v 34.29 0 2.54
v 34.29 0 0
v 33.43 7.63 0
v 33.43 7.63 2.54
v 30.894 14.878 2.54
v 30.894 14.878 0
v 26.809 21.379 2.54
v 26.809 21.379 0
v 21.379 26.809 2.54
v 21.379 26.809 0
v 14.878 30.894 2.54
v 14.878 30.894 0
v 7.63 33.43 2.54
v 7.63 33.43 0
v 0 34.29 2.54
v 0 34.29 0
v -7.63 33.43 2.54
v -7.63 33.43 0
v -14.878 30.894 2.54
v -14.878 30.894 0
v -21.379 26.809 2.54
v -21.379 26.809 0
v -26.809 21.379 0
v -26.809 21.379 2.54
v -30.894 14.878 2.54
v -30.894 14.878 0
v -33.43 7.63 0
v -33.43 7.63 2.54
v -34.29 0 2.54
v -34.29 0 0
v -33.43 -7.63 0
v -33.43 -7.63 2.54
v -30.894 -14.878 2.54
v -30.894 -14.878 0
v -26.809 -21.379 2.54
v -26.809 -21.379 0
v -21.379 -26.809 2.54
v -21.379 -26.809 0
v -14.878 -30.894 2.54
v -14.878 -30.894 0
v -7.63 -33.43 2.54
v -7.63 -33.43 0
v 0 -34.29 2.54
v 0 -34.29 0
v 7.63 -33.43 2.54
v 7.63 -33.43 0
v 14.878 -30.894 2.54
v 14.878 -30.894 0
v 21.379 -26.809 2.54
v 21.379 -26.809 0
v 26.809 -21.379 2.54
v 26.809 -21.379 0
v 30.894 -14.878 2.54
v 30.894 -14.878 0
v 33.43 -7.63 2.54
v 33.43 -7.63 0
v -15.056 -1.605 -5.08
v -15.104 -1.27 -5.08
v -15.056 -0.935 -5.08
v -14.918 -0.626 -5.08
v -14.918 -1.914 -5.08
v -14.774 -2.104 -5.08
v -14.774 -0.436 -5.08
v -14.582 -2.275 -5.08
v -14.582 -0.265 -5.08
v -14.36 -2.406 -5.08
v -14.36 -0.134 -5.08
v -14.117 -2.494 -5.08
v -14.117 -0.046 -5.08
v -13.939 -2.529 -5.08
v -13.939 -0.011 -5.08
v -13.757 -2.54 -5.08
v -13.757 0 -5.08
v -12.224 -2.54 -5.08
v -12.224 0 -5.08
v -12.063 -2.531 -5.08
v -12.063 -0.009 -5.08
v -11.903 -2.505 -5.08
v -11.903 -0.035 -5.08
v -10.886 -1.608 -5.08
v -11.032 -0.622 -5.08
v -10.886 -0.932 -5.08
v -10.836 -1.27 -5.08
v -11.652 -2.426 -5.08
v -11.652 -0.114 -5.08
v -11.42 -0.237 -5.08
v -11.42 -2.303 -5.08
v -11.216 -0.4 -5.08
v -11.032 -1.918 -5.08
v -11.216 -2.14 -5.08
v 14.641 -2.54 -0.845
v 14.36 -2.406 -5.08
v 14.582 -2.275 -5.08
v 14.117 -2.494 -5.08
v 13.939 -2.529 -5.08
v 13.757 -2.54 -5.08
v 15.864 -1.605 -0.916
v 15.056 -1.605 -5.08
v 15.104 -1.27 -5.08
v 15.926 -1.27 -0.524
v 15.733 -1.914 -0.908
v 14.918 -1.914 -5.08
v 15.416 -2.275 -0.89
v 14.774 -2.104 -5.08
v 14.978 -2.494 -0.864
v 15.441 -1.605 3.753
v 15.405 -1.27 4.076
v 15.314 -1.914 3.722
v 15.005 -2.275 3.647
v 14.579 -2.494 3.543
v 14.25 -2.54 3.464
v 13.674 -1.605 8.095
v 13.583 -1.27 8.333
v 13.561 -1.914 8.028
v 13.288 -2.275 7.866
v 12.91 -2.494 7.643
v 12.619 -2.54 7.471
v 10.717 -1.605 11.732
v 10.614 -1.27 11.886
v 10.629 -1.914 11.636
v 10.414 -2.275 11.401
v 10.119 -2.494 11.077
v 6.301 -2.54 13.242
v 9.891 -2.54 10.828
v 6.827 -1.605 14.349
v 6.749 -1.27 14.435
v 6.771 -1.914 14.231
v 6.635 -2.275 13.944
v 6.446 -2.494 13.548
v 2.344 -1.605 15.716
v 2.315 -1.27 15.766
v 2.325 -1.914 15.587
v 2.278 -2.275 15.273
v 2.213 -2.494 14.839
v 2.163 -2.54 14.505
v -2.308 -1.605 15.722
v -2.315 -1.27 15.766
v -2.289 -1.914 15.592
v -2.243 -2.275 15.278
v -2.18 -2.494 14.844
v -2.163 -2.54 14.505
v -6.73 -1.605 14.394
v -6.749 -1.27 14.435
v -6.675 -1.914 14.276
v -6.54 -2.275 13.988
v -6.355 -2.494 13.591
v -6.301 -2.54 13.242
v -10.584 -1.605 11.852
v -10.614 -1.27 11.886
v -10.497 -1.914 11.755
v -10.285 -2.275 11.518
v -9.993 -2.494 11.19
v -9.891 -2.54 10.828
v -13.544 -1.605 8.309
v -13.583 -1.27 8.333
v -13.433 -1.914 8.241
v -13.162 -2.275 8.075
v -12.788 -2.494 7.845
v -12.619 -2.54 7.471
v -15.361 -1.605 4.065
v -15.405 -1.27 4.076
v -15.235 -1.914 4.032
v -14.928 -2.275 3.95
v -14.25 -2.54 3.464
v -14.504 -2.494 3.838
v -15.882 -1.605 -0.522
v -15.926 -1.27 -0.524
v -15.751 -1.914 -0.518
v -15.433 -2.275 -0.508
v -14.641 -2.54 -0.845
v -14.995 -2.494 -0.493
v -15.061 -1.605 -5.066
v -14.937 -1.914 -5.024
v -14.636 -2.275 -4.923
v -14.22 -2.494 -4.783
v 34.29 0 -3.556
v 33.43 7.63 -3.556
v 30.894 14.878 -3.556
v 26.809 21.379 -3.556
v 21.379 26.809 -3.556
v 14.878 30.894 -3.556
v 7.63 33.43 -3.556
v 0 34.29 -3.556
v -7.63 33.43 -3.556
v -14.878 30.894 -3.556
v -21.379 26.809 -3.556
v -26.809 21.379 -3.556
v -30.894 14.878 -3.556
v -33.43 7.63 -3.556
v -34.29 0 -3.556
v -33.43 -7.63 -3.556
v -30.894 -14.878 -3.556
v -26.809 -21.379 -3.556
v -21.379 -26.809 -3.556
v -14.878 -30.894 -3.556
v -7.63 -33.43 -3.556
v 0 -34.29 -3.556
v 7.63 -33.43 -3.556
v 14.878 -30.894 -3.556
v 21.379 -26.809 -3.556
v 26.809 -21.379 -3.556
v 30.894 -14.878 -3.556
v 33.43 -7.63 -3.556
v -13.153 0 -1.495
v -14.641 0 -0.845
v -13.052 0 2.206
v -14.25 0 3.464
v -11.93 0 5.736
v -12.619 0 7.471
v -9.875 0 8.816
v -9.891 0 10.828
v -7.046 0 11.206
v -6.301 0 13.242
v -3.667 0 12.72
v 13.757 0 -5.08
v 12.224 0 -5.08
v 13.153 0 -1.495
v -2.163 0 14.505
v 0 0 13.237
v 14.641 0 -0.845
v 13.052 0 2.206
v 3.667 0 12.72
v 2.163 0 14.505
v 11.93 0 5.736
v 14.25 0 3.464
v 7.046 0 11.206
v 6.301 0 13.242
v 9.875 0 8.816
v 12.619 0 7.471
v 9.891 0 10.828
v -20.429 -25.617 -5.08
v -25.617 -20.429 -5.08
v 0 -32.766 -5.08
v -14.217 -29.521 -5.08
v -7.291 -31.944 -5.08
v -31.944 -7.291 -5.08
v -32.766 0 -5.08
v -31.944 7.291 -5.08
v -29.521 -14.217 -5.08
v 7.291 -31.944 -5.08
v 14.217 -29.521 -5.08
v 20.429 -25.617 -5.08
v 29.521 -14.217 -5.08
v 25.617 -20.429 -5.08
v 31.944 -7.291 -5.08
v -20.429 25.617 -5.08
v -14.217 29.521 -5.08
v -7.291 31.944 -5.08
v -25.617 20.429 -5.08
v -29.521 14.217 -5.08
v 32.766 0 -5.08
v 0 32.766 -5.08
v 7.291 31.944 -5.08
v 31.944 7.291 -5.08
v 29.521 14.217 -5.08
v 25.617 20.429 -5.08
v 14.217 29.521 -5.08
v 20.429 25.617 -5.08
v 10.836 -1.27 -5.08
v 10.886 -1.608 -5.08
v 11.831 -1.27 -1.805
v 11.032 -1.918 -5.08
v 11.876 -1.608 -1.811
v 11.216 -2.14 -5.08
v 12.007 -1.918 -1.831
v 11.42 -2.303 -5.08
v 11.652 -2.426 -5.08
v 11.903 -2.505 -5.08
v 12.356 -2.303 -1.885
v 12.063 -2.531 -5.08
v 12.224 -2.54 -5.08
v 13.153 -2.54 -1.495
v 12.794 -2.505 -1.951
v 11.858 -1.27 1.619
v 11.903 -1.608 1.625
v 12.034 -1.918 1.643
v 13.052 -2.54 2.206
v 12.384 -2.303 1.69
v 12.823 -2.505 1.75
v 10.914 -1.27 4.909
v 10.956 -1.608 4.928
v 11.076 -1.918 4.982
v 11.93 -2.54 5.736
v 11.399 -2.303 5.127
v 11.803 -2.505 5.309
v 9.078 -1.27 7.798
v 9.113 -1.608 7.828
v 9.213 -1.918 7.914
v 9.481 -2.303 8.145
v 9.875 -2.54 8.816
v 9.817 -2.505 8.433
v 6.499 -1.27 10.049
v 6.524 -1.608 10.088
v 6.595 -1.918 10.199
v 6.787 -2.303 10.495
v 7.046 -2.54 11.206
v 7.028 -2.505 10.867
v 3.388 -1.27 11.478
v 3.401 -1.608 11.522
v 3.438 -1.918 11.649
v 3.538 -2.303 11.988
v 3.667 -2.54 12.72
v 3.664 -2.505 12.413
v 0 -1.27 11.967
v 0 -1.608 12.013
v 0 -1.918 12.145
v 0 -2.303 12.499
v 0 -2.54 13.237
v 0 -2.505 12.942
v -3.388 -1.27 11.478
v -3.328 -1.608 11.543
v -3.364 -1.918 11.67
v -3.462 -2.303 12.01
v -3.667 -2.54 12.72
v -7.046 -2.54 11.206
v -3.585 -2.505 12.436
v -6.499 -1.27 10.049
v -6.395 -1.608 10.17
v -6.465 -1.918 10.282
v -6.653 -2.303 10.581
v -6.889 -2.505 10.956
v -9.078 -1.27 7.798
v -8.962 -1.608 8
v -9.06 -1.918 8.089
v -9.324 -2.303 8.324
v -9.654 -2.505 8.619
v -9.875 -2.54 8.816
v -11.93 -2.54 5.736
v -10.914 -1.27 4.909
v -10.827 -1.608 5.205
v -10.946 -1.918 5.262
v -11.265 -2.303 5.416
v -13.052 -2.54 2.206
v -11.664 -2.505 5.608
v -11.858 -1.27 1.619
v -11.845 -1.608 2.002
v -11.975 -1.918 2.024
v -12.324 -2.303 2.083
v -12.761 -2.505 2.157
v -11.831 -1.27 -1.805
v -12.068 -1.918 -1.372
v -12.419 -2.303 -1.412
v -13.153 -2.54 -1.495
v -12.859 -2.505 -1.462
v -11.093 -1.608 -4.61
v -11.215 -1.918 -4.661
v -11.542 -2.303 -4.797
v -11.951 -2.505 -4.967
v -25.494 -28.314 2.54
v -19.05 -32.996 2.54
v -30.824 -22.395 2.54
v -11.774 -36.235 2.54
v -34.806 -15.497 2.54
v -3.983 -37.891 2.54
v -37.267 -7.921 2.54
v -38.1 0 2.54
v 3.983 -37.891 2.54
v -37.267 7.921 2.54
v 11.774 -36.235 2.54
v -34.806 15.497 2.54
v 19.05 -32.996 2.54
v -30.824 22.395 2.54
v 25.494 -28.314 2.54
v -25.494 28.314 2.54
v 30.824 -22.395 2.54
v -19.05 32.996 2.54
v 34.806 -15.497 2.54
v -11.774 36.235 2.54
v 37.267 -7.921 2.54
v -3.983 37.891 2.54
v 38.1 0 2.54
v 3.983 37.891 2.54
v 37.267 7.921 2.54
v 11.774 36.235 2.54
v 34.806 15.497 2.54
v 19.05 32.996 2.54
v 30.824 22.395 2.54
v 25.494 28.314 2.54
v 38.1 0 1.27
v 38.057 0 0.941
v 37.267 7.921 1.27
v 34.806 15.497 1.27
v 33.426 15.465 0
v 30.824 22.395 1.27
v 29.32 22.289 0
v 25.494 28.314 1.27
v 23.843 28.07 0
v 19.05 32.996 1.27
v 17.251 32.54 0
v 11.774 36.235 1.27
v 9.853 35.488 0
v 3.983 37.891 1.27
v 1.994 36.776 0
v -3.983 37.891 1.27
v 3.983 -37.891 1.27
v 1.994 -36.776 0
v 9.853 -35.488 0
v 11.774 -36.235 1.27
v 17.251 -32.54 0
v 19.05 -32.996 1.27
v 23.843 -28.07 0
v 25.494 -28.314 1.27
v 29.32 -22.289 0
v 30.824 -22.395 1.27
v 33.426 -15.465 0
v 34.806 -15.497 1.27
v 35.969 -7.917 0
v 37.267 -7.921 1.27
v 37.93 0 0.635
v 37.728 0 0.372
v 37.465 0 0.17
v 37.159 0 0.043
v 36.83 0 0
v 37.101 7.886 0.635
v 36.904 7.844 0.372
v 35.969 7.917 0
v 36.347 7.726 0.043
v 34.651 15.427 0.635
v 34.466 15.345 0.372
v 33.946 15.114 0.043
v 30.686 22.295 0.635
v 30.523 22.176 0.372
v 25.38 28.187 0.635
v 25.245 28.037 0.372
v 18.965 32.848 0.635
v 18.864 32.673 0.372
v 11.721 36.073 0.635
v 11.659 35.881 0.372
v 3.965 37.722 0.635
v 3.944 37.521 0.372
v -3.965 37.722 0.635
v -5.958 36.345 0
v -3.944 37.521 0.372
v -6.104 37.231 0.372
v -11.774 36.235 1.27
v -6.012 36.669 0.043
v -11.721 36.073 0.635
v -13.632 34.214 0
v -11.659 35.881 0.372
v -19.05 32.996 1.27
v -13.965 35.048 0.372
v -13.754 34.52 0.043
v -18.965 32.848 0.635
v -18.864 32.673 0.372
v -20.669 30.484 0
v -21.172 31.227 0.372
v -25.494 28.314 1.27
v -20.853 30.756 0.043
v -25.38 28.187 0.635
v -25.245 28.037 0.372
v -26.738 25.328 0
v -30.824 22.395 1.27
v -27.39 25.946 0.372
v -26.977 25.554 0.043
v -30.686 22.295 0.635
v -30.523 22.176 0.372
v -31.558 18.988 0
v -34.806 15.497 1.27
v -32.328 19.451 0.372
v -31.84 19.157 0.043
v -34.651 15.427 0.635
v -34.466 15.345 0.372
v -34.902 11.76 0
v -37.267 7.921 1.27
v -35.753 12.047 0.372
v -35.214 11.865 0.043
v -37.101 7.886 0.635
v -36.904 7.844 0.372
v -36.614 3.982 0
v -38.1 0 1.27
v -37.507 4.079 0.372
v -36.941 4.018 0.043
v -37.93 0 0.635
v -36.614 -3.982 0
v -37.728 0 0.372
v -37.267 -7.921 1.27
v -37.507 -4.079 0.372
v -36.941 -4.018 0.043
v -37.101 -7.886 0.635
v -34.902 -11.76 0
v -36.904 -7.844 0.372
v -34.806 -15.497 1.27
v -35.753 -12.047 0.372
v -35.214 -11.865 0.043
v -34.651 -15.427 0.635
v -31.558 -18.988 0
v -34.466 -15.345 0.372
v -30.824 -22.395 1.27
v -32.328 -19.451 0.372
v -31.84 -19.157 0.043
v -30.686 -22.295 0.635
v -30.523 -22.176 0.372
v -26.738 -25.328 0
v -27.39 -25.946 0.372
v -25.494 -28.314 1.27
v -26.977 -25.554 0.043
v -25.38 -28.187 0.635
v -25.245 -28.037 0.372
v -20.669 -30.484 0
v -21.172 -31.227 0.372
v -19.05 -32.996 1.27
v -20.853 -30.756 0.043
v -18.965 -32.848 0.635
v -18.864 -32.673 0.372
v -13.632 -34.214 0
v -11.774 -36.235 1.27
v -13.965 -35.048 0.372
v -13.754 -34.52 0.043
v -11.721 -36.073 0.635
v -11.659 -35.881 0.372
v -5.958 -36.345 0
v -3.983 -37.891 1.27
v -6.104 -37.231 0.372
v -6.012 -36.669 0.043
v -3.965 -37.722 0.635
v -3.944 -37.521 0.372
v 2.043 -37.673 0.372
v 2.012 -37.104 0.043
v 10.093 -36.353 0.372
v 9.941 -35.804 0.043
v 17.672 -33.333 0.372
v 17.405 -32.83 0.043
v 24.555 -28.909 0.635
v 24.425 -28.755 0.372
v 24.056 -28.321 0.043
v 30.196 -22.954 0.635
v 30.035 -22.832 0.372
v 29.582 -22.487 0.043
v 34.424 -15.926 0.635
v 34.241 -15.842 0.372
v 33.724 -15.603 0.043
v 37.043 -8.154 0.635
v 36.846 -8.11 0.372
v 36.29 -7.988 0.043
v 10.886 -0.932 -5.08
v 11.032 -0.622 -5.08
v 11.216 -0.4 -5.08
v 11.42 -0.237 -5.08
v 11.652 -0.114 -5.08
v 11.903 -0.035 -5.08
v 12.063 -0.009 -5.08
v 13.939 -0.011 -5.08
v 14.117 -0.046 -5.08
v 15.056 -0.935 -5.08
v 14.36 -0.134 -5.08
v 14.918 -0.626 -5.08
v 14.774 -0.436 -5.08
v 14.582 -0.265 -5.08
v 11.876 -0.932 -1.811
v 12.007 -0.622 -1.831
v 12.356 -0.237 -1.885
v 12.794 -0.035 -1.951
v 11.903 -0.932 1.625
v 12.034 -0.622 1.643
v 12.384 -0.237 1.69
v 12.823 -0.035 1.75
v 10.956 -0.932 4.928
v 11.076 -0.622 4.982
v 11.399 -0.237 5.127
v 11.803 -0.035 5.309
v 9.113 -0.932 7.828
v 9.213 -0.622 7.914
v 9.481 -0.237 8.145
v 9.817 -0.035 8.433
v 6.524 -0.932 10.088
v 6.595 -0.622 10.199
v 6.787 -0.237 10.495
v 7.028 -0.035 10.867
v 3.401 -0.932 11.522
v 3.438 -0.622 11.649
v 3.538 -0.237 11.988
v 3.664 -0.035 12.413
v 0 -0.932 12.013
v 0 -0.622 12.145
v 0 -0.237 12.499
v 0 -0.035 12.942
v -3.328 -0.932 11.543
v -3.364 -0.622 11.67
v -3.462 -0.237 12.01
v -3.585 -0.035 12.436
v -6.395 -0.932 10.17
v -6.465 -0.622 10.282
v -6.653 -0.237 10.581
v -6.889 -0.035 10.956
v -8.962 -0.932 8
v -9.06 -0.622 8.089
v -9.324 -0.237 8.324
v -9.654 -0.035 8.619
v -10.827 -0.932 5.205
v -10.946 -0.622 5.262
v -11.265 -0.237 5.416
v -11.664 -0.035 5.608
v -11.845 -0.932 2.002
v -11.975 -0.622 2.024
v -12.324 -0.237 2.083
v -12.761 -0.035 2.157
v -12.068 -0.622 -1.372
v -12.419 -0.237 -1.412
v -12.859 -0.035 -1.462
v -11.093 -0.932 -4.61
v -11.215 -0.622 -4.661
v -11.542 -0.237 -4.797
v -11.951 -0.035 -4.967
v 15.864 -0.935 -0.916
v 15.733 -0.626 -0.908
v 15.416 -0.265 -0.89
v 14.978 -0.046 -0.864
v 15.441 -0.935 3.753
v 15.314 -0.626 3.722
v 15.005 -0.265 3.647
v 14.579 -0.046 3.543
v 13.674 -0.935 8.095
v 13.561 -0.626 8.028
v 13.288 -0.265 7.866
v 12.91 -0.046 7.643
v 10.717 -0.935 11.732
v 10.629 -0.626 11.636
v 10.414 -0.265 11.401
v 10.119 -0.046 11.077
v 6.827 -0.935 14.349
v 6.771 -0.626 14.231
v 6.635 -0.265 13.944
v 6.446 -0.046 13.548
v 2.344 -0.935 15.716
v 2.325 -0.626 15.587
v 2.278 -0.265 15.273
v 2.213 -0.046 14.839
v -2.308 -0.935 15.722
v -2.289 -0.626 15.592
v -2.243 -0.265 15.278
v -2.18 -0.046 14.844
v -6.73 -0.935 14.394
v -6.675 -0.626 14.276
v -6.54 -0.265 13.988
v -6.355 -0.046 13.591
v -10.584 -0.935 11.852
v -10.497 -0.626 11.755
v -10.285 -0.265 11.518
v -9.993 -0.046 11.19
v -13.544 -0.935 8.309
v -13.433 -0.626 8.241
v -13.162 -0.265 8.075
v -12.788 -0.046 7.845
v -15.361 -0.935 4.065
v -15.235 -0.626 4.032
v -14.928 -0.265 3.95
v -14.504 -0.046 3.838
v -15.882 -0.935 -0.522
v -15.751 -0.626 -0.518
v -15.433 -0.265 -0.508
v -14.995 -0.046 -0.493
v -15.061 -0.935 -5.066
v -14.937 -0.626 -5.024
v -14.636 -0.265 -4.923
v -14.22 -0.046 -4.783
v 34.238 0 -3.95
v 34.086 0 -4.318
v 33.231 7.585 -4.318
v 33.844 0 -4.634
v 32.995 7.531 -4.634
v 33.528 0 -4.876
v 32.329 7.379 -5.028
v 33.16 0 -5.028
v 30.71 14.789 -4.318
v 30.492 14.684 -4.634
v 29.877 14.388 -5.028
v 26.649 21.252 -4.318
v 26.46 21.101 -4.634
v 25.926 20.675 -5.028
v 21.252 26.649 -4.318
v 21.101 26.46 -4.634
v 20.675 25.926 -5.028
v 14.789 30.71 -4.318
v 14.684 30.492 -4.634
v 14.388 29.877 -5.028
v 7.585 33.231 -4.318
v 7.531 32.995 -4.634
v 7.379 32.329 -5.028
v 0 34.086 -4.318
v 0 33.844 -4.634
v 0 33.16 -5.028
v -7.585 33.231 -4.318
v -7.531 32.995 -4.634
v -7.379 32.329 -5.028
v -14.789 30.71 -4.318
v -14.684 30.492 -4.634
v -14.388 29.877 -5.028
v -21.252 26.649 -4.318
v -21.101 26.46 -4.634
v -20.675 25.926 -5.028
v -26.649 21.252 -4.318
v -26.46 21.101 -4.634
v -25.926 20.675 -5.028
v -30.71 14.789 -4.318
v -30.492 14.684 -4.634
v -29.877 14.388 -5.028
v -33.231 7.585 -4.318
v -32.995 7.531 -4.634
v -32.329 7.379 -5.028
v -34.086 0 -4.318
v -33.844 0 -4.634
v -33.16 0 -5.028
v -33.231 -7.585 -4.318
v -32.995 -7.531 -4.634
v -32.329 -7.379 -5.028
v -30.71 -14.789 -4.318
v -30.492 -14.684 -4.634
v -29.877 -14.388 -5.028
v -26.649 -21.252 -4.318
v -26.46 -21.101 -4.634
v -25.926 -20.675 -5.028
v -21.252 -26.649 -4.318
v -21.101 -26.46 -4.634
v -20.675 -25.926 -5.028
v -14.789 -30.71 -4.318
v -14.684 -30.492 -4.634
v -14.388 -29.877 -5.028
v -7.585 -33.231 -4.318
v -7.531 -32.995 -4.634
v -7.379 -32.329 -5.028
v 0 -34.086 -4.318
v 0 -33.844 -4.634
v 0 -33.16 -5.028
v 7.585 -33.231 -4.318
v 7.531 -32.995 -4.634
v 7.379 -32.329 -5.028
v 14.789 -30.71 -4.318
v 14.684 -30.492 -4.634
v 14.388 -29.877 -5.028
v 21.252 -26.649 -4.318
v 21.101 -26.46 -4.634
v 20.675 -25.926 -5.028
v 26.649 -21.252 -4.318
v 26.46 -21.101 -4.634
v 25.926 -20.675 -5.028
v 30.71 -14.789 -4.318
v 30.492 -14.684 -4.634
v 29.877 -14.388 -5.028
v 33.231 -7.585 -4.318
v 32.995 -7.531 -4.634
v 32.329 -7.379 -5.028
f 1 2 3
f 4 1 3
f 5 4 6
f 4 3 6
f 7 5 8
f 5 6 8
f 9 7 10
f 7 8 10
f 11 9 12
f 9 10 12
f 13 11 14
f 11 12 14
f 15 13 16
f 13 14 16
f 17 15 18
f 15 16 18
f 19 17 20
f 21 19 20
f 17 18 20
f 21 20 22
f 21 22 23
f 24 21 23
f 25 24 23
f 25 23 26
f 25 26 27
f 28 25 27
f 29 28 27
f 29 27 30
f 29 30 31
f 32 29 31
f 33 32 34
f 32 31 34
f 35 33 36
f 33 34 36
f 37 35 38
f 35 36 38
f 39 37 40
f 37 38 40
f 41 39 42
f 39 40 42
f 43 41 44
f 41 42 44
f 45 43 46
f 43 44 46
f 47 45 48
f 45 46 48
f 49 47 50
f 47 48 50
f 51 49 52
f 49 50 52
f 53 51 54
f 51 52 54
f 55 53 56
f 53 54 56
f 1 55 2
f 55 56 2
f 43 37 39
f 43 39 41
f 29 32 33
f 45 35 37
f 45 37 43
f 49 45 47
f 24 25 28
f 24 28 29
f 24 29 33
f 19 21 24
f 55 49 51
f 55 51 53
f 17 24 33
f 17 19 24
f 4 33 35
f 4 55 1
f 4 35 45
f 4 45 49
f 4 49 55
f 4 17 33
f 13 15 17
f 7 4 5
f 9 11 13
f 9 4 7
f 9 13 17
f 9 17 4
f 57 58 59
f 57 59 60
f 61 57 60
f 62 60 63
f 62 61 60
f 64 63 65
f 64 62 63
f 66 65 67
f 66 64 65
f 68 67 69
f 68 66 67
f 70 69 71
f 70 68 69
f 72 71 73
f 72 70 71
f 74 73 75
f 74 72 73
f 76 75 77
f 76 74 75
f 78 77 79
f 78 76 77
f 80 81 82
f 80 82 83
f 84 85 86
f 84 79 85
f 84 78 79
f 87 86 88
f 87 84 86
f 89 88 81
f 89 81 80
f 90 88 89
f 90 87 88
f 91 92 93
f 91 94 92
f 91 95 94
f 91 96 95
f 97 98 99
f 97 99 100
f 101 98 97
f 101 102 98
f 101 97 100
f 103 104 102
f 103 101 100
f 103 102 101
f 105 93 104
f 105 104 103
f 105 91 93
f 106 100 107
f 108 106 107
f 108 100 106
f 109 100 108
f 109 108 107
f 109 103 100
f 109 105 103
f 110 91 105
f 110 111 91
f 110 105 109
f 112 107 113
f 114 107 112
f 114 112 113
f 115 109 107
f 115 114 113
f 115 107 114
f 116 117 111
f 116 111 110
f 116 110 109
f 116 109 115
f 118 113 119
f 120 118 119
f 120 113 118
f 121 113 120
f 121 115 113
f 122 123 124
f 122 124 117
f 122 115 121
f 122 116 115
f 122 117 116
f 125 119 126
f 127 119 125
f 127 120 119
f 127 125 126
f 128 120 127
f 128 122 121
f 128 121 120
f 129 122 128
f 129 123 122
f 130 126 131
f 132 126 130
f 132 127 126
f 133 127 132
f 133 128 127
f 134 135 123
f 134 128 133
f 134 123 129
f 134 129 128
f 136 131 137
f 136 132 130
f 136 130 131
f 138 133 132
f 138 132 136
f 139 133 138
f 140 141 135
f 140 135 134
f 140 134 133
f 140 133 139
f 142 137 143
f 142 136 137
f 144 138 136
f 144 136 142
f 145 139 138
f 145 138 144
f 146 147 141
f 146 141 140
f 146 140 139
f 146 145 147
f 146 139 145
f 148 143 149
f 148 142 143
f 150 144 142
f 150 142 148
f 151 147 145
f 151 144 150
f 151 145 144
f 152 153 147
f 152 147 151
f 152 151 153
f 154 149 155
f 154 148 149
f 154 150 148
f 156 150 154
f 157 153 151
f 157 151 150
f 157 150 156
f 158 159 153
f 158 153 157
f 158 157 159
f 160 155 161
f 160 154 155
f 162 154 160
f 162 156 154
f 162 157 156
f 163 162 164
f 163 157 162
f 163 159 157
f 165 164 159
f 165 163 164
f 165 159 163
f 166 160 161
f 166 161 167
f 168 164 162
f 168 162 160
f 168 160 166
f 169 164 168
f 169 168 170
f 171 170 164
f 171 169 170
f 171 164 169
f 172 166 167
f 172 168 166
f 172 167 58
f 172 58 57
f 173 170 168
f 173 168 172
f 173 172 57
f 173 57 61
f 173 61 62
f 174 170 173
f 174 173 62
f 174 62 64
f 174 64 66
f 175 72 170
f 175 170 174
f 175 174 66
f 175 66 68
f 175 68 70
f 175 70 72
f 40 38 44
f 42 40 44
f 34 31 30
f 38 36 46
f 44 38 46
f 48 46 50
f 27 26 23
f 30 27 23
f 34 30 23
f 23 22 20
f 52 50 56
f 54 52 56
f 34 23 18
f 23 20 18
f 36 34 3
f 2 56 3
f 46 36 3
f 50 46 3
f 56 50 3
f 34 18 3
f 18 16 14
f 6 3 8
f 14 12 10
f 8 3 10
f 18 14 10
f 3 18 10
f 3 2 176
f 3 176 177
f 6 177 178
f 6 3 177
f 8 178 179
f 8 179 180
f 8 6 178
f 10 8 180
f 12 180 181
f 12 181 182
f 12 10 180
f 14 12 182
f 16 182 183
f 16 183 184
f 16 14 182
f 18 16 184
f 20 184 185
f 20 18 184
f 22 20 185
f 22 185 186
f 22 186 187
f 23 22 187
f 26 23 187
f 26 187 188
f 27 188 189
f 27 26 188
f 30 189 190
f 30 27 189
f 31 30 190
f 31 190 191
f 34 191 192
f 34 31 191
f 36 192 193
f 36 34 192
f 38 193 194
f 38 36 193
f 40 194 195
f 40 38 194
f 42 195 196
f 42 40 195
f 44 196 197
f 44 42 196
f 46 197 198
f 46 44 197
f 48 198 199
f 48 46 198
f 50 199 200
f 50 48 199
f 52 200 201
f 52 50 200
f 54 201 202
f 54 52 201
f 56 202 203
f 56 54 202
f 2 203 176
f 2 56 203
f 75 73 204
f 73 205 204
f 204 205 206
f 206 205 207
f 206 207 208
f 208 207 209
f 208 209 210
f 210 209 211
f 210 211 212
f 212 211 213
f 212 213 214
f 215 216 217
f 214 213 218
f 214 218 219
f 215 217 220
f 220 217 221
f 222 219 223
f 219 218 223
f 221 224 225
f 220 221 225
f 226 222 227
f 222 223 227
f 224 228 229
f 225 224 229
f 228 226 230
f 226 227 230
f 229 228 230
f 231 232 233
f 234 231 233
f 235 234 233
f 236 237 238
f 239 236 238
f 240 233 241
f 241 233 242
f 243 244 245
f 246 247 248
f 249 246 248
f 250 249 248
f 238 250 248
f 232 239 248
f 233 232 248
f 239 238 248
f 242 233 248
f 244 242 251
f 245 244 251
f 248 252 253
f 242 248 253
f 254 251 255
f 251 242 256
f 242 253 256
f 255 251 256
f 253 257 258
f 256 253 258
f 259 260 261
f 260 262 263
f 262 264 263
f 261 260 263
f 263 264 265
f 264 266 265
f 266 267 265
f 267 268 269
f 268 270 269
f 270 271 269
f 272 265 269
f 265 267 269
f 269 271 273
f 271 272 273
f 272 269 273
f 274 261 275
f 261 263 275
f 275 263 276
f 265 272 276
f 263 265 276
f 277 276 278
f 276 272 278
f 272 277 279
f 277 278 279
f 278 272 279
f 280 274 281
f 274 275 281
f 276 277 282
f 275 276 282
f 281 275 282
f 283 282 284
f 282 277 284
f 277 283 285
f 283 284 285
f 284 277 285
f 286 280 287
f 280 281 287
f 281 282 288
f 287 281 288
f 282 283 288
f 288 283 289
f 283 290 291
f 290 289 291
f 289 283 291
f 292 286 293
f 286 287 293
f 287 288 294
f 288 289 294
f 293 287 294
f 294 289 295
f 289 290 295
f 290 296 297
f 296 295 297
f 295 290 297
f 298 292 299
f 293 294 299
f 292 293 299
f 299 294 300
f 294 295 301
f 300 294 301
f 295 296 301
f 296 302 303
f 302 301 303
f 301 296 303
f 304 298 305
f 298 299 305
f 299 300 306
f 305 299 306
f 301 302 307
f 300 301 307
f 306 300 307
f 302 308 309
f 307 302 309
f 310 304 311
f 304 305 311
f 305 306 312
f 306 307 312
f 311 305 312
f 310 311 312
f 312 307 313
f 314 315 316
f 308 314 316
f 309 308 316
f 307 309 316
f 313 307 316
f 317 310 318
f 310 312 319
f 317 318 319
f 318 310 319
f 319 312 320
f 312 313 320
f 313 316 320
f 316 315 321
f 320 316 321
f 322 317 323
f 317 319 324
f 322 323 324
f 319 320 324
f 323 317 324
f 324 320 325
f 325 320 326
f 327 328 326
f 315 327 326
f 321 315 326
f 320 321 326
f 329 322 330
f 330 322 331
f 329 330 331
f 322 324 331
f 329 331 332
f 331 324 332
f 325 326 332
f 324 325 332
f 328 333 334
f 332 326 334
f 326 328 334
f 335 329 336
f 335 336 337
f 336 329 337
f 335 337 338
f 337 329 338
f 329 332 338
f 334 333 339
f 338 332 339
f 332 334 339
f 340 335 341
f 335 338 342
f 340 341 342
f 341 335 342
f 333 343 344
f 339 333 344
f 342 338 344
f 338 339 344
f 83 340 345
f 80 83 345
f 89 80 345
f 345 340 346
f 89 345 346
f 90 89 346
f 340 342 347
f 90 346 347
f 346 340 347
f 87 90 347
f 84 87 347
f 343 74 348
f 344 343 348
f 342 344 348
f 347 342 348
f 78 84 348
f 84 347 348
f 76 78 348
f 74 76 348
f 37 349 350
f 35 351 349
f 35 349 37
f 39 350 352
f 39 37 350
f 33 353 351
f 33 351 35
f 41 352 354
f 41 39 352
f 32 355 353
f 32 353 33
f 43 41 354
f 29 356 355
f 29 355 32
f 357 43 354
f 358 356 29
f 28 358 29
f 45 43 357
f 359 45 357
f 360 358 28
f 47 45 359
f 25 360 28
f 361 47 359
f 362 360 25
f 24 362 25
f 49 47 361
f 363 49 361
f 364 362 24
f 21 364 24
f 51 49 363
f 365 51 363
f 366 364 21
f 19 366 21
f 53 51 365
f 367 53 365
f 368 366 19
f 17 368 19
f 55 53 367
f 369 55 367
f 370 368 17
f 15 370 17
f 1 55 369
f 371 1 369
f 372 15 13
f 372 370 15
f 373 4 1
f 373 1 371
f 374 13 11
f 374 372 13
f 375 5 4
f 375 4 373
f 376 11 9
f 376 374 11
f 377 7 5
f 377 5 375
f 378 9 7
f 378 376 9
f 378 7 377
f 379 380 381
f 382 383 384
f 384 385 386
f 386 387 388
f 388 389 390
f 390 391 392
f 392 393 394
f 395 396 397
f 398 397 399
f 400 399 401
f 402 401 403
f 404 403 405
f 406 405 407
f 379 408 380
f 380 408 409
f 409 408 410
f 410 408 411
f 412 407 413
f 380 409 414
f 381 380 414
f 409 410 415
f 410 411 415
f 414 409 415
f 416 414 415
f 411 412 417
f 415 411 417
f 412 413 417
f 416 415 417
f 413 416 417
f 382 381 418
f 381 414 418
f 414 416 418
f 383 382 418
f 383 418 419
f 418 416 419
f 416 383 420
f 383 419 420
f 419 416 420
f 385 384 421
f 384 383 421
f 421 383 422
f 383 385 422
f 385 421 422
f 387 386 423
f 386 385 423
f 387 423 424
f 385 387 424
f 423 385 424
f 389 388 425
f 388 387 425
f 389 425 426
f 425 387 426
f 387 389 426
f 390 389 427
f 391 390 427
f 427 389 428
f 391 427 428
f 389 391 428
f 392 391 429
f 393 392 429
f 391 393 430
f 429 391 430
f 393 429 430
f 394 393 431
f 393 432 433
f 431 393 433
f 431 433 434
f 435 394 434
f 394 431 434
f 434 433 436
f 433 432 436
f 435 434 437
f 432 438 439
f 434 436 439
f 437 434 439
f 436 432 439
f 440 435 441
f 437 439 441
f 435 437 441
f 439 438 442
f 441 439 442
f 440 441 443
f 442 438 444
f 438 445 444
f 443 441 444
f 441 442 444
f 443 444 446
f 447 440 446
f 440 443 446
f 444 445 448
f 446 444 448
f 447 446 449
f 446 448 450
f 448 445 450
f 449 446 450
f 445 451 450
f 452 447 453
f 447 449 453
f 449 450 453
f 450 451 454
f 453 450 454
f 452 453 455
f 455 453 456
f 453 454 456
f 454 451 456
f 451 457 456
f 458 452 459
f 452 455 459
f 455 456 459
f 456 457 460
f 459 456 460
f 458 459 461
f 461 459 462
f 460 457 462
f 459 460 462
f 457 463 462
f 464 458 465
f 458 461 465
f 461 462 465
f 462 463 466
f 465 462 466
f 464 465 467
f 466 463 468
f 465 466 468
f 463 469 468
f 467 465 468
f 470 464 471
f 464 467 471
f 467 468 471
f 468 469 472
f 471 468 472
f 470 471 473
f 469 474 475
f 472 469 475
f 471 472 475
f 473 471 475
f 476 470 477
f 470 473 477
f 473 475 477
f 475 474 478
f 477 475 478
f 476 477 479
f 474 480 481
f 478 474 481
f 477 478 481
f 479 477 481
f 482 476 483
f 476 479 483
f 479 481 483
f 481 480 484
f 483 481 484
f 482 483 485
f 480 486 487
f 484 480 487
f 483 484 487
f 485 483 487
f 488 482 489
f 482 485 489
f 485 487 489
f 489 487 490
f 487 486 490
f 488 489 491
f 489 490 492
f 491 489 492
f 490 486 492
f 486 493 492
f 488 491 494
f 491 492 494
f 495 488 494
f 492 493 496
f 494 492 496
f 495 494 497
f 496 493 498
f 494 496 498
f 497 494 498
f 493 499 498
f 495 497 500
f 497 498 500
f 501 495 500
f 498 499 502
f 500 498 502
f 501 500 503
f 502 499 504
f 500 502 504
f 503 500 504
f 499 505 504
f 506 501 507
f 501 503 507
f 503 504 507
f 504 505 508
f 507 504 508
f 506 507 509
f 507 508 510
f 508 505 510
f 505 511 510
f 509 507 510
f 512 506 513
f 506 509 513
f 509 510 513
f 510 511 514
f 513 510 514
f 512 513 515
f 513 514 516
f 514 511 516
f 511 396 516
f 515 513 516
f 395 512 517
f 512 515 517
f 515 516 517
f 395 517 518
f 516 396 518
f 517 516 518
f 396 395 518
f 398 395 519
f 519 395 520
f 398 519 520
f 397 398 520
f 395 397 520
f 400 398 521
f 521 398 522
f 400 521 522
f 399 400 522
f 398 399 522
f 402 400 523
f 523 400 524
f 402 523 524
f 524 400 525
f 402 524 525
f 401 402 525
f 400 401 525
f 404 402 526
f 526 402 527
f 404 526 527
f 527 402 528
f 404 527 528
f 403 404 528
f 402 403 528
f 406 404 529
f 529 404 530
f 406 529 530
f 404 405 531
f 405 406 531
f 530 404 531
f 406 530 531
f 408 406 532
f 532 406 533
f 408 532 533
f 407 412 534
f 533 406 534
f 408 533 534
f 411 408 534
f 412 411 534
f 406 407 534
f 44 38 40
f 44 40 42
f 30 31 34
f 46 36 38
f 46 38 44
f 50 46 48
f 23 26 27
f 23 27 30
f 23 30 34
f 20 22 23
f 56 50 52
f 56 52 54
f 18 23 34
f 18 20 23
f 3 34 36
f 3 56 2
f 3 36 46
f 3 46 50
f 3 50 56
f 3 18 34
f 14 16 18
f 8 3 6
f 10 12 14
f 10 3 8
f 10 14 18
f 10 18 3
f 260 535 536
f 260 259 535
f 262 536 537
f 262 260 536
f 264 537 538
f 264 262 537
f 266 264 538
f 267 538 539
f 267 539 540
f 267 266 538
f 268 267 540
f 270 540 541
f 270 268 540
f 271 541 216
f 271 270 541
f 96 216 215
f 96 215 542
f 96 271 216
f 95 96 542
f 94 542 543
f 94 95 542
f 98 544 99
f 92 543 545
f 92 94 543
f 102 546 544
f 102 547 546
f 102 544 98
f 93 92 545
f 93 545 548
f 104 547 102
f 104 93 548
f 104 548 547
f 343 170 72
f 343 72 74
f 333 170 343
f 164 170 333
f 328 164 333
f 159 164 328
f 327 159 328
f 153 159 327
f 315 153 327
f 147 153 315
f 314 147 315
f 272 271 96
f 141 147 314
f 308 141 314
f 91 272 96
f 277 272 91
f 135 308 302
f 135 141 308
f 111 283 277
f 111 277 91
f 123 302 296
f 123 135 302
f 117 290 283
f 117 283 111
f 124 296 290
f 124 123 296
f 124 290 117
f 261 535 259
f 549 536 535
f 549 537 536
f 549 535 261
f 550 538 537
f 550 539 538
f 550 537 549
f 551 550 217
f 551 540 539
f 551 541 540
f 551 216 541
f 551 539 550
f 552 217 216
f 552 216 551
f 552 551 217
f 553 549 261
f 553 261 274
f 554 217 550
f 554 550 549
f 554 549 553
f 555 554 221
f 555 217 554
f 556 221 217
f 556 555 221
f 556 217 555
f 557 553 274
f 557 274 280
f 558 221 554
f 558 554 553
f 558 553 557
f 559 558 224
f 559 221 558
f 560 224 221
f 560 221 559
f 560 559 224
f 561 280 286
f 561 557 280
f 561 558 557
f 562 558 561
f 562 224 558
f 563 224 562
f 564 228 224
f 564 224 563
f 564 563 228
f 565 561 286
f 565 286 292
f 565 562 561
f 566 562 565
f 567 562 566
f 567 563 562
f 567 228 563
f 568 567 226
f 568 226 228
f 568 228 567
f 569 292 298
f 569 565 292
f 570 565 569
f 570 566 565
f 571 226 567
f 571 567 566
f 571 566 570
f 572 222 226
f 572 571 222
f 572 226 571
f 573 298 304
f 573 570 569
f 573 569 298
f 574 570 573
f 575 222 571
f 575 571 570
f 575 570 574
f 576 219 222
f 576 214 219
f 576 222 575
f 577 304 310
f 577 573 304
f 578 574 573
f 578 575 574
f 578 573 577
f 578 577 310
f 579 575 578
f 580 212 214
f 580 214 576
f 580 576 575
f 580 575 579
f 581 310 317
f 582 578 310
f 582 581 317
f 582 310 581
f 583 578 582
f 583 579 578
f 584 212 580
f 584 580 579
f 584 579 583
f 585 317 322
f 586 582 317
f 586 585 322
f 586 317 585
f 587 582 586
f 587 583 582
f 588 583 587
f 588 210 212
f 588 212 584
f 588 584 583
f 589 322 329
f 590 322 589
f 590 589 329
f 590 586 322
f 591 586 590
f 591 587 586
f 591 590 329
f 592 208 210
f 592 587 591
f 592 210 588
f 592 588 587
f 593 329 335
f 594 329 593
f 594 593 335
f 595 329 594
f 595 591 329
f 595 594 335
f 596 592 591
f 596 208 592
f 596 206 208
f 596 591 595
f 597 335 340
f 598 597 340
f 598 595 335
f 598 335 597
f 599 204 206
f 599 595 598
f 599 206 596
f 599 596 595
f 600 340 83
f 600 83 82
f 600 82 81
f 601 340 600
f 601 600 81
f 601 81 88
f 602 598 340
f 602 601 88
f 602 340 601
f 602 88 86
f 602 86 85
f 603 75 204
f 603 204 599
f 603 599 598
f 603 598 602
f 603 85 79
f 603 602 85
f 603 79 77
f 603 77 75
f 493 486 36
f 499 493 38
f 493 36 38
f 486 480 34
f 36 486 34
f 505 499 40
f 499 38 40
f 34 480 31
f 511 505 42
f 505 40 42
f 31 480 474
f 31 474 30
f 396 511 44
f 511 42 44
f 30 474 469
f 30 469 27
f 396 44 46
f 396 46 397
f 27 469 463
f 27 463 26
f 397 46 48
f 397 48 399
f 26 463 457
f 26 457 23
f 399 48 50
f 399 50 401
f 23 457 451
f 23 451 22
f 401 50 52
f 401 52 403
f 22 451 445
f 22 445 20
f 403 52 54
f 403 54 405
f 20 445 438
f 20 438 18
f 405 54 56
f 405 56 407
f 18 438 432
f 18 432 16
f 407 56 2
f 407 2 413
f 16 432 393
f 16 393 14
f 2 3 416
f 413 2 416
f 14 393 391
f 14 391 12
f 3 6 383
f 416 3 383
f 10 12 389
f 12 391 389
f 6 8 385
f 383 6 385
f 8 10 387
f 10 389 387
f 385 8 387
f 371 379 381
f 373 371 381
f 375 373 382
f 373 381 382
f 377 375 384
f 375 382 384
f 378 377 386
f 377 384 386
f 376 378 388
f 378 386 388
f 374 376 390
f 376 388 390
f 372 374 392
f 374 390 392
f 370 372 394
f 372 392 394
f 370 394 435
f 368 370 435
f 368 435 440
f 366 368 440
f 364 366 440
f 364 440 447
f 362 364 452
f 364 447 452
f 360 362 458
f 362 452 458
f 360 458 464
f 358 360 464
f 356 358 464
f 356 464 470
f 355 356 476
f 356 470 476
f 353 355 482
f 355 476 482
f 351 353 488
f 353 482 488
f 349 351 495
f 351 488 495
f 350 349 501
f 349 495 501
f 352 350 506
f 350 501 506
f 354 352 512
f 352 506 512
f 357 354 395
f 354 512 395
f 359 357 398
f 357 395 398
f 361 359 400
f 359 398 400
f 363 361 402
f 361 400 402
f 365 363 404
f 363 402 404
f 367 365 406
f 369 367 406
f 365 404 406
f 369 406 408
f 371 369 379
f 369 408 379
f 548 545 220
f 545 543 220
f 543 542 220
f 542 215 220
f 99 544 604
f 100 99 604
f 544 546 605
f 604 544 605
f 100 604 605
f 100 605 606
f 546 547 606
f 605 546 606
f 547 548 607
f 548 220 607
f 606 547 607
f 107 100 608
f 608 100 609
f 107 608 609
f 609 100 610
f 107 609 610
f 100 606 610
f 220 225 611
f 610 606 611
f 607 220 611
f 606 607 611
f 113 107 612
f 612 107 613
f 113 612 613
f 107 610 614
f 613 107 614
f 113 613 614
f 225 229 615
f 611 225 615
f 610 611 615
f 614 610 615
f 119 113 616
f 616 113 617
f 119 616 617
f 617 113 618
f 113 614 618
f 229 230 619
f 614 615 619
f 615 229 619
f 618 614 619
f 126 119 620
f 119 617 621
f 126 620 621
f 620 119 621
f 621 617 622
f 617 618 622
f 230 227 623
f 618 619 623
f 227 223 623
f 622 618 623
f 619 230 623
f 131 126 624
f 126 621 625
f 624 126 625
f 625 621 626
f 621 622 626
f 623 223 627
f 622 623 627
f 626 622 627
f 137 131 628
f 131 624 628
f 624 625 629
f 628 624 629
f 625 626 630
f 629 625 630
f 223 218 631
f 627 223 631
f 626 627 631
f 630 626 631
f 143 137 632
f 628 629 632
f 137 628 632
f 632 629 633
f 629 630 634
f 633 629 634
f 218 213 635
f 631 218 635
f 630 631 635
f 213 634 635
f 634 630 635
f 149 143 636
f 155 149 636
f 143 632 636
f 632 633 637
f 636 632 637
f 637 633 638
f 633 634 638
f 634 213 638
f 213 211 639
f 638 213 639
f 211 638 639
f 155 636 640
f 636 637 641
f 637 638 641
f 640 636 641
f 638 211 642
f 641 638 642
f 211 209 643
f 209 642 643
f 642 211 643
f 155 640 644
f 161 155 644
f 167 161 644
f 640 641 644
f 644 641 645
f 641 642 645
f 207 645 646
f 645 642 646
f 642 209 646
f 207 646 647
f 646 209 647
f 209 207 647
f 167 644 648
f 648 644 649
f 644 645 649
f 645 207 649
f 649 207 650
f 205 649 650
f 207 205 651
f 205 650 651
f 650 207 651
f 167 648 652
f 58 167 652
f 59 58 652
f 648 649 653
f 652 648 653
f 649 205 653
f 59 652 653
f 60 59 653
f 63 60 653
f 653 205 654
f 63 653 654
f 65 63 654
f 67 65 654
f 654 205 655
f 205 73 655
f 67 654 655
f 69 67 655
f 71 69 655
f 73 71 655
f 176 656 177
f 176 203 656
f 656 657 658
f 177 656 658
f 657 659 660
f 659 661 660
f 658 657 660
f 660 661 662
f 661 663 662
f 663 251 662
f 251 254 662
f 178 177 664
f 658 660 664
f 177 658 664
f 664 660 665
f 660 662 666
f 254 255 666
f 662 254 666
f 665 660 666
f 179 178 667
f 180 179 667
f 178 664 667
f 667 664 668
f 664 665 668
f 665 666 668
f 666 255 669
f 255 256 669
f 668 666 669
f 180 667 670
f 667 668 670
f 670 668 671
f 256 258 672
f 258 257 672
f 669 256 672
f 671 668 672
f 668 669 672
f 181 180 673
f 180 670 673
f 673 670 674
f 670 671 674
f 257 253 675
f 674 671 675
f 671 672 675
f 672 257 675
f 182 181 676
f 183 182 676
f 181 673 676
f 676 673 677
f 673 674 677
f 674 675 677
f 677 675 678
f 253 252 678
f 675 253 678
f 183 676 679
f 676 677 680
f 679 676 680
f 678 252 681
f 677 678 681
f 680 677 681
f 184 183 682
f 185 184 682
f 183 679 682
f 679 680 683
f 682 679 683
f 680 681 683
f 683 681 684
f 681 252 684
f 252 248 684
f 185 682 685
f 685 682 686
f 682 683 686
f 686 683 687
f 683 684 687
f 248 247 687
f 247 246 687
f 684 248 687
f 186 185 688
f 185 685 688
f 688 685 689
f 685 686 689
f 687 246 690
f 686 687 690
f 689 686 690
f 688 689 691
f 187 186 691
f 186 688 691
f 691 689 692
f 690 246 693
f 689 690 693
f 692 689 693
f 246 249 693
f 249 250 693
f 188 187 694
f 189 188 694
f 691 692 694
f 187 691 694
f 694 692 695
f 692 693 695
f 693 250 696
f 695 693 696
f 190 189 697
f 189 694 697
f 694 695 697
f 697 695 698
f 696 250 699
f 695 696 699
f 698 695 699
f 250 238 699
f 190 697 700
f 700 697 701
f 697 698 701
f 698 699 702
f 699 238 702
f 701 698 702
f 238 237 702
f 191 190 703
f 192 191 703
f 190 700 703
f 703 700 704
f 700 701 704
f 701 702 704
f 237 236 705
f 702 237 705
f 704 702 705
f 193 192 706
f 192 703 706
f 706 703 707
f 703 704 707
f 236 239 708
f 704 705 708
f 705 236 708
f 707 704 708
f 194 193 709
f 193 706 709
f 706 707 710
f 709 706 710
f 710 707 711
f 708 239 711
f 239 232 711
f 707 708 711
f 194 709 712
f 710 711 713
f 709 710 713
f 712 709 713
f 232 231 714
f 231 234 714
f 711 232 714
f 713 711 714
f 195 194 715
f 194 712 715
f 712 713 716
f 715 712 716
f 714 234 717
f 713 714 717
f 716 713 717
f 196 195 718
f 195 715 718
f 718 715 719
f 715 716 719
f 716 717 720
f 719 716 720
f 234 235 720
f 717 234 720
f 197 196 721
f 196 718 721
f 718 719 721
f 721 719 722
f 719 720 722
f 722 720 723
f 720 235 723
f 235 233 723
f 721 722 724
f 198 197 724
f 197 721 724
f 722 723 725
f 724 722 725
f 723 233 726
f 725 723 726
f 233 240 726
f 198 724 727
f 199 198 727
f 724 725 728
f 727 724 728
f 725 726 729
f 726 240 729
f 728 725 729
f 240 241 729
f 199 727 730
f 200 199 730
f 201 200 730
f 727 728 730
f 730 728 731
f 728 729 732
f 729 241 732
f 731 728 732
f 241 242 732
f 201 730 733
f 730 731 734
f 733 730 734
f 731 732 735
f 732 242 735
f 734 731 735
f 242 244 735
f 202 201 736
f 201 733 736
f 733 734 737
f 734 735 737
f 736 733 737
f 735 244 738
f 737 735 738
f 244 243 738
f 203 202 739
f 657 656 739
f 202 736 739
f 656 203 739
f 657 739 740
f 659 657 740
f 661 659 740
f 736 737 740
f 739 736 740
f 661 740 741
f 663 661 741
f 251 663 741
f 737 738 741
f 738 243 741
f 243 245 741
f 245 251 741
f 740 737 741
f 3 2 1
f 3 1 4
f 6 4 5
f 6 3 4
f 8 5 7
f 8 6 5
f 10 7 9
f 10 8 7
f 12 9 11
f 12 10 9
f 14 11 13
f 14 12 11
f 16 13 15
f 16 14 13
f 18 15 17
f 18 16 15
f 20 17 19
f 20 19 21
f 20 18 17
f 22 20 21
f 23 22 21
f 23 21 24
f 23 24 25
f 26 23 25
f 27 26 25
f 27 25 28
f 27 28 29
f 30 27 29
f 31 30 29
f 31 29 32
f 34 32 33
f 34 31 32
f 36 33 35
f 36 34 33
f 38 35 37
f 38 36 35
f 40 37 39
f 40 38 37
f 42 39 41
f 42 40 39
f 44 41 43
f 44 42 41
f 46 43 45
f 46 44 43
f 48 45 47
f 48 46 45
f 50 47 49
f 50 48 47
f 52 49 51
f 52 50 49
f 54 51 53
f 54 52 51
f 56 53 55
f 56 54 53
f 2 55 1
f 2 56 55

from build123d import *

# Parameters (mm, degrees)
F0_R      = 38.1
F0_R_2    = 34.29
F1_DEPTH  = 2.54
F2_R      = 1.27
F3_R      = 15.9349735513
F3_R_2    = 11.9674764151
F4_DEPTH  = 2.54
F5_R      = 1.26999
F6_DEPTH  = 5.08
F7_DEPTH  = 2.54
F8_R      = 1.524
F9_W      = 32.174937427
F9_H      = 8.878018707
F10_DEPTH = 17.2739680856


# Not quite as in the source:
# - a fillet or chamfer is up to 0.001 mm smaller than in the source, because OpenCascade refuses the exact size


with BuildPart() as f1:
    # F0 (on Top) → F1 (new body)
    with BuildSketch(Plane.XY):
        Circle(F0_R)
        Circle(F0_R_2, mode=Mode.SUBTRACT)
    extrude(amount=F1_DEPTH)

    # F2
    f2_edges = [f1.edges().sort_by_distance(p)[0] for p in [
        (-38.1, 0, 0),
    ]]
    fillet(f2_edges, radius=F2_R)


with BuildPart() as f4:
    # F3 (on Front) → F4 (new body)
    with BuildSketch(Plane.XZ):
        Circle(F3_R)
        Circle(F3_R_2, mode=Mode.SUBTRACT)
    extrude(amount=F4_DEPTH)

    # F5 (radius 1.27 in the source; OpenCascade refuses exactly that, so slightly less here)
    f5_edges = [f4.edges().sort_by_distance(p)[0] for p in [
        (-15.934974, -2.54, 0),
        (-11.967476, 0, 0),
        (-15.934974, 0, 0),
        (-11.967476, -2.54, 0),
    ]]
    fillet(f5_edges, radius=F5_R)

    # F9 (on face) → F10 (cut)
    with BuildSketch(Plane(origin=(0, 0, -5.08), x_dir=(1, 0, 0), z_dir=(0, 0, -1))):
        with Locations((0.0944472849, 1.2278128415)):
            Rectangle(F9_W, F9_H)
    extrude(amount=F10_DEPTH, mode=Mode.SUBTRACT)


with BuildPart() as f6:
    # F0 (on Top) → F6 (new body)
    with BuildSketch(Plane.XY):
        Circle(F0_R_2)
    extrude(amount=-F6_DEPTH)

    # F8
    f8_edges = [f6.edges().sort_by_distance(p)[0] for p in [
        (-34.29, 0, -5.08),
    ]]
    fillet(f8_edges, radius=F8_R)


with BuildPart() as f7:
    # F0 (on Top) → F7 (new body)
    with BuildSketch(Plane.XY):
        Circle(F0_R_2)
    extrude(amount=F7_DEPTH)


solid = Compound([f1.part, f4.part, f6.part, f7.part])
